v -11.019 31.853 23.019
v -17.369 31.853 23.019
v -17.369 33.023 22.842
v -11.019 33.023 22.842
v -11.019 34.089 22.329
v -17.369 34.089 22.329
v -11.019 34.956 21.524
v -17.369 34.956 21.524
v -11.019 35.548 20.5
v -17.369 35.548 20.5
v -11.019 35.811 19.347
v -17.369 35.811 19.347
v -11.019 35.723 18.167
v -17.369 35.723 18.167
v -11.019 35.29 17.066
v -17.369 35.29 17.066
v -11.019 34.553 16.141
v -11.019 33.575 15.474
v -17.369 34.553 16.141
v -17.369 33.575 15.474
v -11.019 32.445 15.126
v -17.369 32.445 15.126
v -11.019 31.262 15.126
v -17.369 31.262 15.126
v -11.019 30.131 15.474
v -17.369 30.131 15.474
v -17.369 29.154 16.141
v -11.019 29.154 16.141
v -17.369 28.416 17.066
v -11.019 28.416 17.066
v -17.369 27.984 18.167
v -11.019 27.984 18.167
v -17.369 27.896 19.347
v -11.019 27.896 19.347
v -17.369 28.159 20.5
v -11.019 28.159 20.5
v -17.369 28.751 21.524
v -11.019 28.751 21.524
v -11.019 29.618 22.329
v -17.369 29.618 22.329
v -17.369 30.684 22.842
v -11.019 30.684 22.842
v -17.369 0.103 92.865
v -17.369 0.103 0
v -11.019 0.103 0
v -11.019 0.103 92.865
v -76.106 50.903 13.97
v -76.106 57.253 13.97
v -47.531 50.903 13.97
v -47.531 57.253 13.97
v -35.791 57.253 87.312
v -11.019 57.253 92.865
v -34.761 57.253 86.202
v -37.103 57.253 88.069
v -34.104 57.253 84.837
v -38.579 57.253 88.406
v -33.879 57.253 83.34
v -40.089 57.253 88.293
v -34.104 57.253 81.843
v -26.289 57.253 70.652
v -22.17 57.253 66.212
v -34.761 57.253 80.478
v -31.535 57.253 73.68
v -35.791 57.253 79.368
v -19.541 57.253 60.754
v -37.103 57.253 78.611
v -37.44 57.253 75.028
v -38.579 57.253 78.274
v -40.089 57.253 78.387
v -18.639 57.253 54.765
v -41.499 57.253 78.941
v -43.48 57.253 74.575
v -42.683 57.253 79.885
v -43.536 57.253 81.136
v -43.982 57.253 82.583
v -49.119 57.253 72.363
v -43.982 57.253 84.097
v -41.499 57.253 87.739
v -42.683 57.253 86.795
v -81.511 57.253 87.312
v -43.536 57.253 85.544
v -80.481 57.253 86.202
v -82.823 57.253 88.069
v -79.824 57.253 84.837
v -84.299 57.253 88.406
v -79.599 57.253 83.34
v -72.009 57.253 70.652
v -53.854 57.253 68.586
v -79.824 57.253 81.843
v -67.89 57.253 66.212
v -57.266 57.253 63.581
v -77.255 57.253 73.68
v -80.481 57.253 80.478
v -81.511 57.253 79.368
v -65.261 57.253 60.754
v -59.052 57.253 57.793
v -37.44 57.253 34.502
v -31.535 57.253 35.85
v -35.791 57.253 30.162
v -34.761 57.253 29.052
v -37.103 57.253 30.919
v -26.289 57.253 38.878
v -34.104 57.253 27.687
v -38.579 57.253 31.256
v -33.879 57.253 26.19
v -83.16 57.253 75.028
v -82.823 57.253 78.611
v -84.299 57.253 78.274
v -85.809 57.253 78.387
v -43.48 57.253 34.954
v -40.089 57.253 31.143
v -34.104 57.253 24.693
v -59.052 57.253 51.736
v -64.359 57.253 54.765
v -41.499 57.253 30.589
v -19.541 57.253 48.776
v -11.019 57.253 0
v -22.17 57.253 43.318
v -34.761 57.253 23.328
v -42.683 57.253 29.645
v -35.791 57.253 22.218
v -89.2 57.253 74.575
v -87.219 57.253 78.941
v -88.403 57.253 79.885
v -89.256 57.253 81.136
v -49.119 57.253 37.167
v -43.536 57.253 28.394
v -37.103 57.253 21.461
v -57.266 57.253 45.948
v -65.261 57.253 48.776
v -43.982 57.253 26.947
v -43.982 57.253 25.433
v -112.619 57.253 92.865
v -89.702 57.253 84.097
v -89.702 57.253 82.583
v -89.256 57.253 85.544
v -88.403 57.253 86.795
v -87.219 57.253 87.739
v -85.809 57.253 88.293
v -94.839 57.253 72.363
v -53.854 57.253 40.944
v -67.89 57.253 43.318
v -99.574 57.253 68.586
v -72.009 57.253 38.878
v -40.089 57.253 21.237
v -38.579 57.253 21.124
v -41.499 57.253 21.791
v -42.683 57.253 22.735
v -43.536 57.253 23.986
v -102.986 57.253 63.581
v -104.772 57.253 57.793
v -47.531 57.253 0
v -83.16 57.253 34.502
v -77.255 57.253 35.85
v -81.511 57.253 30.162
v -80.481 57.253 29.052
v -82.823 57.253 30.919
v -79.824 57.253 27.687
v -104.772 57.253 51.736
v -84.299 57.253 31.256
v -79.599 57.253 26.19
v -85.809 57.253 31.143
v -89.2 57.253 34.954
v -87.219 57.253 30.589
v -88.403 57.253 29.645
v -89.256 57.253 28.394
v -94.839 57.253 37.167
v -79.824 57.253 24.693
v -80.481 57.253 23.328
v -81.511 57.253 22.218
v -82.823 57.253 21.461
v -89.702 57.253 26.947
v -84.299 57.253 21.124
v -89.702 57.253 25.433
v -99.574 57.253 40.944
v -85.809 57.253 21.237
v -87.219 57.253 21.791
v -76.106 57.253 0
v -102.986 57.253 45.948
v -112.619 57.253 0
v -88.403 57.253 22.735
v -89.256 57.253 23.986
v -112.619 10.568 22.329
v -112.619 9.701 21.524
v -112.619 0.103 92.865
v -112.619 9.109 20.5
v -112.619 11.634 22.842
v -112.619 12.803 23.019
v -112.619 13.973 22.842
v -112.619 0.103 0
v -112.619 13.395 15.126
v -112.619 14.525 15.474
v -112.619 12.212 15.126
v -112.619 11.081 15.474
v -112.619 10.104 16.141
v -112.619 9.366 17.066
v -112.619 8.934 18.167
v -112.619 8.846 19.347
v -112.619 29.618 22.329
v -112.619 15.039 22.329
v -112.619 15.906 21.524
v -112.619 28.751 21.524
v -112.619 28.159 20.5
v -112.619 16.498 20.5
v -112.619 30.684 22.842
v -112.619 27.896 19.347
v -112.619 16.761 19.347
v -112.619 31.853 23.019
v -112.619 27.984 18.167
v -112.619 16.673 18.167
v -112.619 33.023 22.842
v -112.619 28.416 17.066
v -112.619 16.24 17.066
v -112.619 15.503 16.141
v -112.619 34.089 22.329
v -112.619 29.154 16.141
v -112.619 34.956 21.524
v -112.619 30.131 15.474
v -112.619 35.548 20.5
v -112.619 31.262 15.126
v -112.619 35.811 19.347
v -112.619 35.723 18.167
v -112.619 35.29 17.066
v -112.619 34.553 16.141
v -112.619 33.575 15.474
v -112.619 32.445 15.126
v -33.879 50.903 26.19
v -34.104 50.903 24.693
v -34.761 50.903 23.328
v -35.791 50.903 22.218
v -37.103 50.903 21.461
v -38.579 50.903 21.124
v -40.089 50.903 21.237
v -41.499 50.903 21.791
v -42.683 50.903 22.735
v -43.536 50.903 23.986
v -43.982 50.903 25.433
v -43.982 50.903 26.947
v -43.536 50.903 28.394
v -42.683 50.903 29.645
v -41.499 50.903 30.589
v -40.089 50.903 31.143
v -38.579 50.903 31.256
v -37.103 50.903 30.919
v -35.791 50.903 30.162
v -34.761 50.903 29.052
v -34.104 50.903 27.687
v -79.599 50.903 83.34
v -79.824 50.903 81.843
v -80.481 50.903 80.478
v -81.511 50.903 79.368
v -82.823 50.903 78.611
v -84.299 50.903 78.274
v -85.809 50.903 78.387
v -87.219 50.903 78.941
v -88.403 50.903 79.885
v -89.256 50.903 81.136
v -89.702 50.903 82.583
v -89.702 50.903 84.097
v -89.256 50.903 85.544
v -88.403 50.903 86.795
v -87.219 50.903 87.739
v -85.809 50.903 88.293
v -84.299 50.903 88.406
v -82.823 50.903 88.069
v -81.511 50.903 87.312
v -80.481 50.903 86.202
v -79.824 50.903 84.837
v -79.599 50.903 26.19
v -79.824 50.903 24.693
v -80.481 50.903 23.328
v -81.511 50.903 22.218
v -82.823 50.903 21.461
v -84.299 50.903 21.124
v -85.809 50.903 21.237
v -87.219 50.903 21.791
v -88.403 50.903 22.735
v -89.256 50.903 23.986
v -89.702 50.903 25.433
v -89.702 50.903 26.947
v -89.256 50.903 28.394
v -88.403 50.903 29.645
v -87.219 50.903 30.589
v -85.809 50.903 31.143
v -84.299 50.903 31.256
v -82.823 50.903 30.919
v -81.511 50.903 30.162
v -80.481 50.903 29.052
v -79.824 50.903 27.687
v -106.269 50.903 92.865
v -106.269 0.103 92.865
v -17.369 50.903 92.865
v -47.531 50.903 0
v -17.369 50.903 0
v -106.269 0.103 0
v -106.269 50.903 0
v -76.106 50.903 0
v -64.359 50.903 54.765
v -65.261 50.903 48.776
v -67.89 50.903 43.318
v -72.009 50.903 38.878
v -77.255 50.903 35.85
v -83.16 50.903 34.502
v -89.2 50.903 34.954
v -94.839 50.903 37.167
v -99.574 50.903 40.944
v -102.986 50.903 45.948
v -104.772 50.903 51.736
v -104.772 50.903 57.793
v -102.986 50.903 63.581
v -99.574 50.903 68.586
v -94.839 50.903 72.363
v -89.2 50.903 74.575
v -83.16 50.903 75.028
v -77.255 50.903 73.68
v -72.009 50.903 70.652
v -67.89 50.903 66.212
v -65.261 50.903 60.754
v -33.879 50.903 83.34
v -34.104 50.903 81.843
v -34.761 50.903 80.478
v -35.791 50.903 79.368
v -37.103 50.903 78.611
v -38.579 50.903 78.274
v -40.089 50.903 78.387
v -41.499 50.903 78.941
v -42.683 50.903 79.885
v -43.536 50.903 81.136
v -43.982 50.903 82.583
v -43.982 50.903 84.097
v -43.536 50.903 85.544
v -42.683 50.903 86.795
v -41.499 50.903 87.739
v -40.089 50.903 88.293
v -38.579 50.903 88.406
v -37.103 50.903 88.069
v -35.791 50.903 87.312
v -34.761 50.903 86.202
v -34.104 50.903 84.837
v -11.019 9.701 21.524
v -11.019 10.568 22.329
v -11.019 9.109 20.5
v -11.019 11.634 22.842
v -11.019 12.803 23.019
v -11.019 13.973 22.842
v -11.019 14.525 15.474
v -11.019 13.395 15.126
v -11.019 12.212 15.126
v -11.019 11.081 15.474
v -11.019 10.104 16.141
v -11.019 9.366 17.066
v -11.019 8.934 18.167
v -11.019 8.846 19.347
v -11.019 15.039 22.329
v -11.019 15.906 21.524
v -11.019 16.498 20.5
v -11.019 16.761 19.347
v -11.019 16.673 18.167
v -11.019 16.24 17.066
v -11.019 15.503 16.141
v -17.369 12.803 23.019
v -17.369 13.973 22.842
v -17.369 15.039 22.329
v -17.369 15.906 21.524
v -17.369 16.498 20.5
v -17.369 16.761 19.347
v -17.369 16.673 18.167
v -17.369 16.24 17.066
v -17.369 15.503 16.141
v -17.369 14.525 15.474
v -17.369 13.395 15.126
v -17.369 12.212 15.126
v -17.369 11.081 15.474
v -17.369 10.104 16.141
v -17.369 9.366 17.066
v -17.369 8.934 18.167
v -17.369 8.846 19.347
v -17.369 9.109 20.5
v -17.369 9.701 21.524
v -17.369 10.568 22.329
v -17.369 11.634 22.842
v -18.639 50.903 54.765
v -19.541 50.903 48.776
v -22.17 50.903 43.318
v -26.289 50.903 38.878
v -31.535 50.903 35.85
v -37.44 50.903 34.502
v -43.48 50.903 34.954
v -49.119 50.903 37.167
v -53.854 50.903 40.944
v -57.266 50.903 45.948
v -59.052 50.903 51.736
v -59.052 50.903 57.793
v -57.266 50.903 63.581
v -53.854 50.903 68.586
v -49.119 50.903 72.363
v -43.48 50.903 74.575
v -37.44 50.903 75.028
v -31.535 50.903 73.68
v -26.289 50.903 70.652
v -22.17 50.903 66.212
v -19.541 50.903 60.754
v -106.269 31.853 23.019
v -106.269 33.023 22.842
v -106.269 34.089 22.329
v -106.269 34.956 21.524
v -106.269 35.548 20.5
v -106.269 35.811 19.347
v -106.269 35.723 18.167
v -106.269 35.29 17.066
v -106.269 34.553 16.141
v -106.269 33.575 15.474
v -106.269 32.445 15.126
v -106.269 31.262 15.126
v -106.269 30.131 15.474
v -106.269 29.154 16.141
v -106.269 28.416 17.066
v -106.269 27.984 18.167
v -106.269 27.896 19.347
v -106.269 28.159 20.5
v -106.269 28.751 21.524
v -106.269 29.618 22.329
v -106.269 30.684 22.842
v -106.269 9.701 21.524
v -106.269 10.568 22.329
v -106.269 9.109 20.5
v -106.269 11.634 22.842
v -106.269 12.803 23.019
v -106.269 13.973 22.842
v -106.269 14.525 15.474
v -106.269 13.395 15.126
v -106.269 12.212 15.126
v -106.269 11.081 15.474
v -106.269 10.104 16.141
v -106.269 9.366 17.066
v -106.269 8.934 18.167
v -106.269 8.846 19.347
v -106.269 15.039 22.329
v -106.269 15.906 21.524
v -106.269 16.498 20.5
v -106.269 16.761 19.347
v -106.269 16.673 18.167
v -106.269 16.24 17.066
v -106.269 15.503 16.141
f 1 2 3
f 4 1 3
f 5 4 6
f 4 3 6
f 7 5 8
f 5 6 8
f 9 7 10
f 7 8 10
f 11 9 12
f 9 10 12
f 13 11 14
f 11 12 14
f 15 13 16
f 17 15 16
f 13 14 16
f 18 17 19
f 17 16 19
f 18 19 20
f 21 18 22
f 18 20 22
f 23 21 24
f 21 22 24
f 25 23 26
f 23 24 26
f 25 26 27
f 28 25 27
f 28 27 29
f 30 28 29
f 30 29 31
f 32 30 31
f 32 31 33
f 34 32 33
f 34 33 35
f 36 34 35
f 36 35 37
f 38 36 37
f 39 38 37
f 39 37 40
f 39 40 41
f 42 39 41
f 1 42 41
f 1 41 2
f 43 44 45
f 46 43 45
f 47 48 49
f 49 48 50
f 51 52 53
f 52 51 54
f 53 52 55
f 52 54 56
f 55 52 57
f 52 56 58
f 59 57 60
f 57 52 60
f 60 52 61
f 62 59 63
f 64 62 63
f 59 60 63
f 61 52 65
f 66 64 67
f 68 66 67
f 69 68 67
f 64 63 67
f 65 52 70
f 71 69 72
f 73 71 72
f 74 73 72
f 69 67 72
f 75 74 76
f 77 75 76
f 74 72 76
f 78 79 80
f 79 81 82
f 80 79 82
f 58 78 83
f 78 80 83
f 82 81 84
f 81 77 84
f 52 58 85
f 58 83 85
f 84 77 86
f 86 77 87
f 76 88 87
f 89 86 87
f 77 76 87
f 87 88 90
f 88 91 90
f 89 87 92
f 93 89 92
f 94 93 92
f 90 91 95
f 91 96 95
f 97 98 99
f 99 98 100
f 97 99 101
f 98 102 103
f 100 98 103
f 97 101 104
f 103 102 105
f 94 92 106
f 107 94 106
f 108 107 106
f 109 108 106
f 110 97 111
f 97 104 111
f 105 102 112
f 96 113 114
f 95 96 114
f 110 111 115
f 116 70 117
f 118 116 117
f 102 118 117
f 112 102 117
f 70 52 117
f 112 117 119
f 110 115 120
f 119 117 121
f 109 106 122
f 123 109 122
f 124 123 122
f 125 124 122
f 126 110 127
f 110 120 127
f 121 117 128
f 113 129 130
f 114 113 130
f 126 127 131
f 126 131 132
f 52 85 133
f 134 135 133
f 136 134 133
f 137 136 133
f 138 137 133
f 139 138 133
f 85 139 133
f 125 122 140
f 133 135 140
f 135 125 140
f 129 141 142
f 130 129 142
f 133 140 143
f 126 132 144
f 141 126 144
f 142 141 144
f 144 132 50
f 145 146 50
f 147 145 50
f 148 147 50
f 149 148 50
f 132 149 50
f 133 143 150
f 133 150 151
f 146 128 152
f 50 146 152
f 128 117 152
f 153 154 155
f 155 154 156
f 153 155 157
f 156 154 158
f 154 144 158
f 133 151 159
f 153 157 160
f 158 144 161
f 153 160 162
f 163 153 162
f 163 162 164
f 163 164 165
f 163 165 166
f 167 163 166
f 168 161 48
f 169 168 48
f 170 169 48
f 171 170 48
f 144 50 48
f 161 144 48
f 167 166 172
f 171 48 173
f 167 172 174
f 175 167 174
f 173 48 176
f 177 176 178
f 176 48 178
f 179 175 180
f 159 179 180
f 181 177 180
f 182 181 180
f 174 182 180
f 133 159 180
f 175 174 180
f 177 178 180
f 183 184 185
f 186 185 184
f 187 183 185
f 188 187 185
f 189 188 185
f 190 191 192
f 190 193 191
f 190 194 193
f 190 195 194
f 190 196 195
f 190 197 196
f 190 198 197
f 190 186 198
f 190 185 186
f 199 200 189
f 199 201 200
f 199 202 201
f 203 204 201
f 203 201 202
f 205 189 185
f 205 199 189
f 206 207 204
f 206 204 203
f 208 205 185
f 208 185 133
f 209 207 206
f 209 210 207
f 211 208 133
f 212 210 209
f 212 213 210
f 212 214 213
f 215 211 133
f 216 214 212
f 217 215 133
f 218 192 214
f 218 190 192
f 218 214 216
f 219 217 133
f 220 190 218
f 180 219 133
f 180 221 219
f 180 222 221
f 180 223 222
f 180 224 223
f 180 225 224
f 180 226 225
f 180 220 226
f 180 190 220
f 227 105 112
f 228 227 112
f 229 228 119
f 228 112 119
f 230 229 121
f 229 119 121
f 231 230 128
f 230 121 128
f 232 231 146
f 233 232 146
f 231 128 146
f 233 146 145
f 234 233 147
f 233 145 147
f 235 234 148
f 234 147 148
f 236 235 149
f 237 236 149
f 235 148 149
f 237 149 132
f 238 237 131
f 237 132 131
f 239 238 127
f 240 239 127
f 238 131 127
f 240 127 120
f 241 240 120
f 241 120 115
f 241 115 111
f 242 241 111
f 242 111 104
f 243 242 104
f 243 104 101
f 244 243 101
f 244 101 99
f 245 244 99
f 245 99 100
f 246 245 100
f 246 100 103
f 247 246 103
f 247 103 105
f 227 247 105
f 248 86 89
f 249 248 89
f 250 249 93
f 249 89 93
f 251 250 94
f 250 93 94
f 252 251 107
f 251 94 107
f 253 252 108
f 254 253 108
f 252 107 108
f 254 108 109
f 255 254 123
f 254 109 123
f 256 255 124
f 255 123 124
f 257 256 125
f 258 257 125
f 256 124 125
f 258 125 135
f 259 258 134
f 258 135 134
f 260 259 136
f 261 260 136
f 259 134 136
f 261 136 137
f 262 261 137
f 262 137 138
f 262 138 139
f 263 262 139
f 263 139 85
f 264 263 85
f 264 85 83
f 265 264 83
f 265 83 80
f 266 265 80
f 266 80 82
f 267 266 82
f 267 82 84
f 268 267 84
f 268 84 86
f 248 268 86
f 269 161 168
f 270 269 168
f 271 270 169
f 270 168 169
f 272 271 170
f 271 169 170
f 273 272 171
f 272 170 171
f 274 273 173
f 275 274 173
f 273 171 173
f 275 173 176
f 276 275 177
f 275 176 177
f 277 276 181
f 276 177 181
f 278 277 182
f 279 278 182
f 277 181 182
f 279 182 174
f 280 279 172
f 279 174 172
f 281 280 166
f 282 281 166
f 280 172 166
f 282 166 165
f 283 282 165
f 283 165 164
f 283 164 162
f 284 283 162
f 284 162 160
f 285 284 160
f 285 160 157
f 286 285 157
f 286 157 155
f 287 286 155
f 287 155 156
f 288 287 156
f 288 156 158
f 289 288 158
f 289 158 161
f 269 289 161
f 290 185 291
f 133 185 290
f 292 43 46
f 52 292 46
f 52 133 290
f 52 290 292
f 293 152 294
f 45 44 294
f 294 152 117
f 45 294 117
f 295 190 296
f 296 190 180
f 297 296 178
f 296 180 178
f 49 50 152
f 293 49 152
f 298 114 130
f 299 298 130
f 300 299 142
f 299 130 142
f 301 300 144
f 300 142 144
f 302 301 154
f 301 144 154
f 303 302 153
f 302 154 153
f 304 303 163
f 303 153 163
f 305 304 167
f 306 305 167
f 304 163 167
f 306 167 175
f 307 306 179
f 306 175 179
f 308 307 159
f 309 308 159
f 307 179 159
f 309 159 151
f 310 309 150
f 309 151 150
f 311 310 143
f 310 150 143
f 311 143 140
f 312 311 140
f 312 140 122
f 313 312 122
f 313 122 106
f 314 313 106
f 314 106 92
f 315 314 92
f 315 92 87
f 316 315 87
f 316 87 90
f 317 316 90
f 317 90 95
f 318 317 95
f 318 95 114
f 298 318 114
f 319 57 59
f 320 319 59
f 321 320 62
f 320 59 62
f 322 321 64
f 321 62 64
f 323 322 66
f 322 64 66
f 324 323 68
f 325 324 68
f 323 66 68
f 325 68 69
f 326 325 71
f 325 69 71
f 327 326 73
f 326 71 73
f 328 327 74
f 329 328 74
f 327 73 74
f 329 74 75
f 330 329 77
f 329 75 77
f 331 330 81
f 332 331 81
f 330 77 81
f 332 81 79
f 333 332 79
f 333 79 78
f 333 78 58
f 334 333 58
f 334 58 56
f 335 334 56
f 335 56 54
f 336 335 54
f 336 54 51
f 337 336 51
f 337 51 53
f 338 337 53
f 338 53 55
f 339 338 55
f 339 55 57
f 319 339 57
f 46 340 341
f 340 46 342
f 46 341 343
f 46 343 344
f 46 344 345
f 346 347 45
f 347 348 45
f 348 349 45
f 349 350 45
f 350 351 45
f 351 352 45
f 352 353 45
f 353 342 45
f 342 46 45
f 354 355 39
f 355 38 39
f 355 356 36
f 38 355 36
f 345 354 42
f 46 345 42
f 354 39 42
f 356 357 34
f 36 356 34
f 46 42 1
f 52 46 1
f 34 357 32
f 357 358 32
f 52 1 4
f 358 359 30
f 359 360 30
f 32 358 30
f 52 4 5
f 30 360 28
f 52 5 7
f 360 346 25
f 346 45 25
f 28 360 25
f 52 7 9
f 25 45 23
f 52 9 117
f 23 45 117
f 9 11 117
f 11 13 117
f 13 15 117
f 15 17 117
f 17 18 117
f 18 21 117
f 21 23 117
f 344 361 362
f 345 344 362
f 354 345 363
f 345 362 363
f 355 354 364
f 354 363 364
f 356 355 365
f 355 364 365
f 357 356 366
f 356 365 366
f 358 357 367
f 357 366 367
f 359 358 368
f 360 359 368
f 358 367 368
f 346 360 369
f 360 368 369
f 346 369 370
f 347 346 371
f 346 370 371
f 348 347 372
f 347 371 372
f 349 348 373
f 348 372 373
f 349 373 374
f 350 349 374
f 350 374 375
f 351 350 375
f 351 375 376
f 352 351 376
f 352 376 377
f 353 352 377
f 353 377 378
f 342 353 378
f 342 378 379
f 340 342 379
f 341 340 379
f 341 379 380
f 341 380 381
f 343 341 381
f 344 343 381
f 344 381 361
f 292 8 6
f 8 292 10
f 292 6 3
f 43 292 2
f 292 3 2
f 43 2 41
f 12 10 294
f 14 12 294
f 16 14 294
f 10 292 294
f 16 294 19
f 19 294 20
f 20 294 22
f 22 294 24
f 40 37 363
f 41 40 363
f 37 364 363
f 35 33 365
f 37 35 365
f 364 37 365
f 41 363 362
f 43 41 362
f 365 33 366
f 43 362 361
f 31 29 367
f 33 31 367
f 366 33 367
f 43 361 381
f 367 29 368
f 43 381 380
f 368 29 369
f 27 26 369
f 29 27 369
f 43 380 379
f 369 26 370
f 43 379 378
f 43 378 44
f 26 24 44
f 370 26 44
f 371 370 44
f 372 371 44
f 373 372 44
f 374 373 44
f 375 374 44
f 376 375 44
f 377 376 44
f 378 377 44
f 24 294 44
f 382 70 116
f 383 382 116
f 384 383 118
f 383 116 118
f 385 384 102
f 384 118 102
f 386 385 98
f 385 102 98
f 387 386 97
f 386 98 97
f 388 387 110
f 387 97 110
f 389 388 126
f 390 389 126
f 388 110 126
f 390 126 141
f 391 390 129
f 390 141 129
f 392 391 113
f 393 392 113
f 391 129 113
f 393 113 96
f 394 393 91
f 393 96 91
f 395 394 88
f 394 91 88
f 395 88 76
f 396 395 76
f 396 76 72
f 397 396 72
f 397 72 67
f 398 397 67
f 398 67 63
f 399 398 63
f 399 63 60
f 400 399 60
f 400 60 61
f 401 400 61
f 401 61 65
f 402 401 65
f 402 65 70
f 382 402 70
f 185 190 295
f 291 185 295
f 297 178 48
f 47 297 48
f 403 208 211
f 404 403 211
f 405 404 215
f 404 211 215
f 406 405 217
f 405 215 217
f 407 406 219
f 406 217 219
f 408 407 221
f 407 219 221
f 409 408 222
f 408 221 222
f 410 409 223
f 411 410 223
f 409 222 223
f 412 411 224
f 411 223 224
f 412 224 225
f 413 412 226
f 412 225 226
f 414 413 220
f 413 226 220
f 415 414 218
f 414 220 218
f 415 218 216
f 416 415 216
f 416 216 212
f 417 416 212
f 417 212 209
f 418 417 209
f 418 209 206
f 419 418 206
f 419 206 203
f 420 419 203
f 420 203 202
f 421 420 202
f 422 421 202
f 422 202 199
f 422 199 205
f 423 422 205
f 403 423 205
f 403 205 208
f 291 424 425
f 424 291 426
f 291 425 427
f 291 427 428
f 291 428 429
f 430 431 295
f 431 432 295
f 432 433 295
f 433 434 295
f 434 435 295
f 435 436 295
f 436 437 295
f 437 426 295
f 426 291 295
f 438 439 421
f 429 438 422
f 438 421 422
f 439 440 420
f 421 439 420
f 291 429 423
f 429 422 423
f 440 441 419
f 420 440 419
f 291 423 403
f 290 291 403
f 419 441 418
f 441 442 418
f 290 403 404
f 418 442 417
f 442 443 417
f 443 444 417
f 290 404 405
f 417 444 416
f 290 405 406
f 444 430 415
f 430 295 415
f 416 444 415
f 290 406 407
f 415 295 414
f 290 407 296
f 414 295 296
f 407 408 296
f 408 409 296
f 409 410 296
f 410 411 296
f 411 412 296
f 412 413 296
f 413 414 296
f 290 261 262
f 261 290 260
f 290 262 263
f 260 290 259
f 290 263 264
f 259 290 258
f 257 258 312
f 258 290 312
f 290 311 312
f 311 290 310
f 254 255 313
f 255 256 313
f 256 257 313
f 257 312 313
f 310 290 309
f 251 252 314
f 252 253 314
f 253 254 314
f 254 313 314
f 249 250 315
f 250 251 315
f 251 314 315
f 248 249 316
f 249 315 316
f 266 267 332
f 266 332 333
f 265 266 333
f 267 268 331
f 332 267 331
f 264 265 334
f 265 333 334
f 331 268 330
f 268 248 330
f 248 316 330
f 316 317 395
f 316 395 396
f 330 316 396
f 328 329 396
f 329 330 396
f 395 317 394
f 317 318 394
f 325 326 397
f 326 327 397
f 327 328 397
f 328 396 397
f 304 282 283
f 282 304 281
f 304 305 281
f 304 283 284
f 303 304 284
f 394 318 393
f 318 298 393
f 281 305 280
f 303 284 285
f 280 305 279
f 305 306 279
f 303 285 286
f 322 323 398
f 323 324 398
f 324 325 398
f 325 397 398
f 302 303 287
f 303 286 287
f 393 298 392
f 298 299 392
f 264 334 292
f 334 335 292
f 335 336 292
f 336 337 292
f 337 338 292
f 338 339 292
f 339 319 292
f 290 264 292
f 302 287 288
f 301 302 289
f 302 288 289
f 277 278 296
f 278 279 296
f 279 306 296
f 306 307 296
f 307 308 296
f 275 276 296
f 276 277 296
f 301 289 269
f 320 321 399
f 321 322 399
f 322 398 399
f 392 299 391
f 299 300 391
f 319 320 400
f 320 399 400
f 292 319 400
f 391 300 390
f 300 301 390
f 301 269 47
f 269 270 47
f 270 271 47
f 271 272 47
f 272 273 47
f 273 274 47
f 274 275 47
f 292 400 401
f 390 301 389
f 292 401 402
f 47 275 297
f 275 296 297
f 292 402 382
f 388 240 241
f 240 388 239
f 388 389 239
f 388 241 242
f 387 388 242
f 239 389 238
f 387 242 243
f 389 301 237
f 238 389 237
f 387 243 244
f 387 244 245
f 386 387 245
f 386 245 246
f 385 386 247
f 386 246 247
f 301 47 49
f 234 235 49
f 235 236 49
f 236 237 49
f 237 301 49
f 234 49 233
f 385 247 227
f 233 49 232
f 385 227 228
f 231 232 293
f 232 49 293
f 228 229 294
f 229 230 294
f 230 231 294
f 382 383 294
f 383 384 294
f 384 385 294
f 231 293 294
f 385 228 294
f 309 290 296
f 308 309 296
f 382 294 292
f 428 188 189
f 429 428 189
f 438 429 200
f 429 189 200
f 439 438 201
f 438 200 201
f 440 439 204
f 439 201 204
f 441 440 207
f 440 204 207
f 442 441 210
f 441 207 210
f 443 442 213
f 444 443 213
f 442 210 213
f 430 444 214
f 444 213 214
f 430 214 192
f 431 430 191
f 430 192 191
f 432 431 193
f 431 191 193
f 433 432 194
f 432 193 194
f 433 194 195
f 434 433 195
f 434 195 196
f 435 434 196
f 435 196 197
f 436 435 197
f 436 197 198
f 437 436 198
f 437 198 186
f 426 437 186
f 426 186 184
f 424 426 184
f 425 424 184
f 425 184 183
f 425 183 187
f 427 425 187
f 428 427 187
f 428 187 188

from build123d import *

# Parameters (mm, degrees)
SKETCH1_W                   = 6.35
SKETCH1_H                   = 57.15
SKETCH1_W_2                 = 88.9
SKETCH1_H_2                 = 6.35
BOSS_EXTRUDE1_DEPTH         = 92.86494
MASTER_CYLINDER_MOUNT_REACH = 59.15
SKETCH2_R                   = 5.08
SKETCH2_R_2                 = 20.32
SKETCH3_R                   = 3.96875
BRACKET_MOUNT_DEPTH         = 102.6


with BuildPart() as part:
    # Sketch1 → Boss-Extrude1 (new body)
    with BuildSketch(Plane.XY):
        with Locations((-109.443697604, 28.678448761)):
            Rectangle(SKETCH1_W, SKETCH1_H)
        with Locations((-61.818697604, 54.078448761)):
            Rectangle(SKETCH1_W_2, SKETCH1_H_2)
        Polygon((-17.368697604, 57.253448761), (-17.368697604, 50.903448761), (-17.368697604, 0.103448761), (-11.018697604, 0.103448761), (-11.018697604, 57.253448761), align=None)
    extrude(amount=BOSS_EXTRUDE1_DEPTH)

    # Sketch2 → Master Cylinder Mount (cut, up to next)
    with BuildSketch(Plane(origin=(0, 57.253448761, 0), x_dir=(1, 0, 0), z_dir=(0, 1, 0)), mode=Mode.PRIVATE) as master_cylinder_mount_sk1:
        Polygon((-47.531197604, 0), (-76.106197604, 0), (-76.106197604, -13.97), (-69.121197604, -13.97), (-54.516197604, -13.97), (-47.531197604, -13.97), align=None)
    master_cylinder_mount_tool1 = extrude(master_cylinder_mount_sk1.sketch, amount=-MASTER_CYLINDER_MOUNT_REACH, mode=Mode.PRIVATE) & part.part
    add(master_cylinder_mount_tool1.solids().sort_by_distance((-61.818698, 57.253449, 6.985))[0], mode=Mode.SUBTRACT)
    # Sketch2 → Master Cylinder Mount (cut, up to next)
    with BuildSketch(Plane(origin=(0, 57.253448761, 0), x_dir=(1, 0, 0), z_dir=(0, 1, 0)), mode=Mode.PRIVATE) as master_cylinder_mount_sk2:
        with Locations((-38.958697604, -26.18994)):
            Circle(SKETCH2_R)
    master_cylinder_mount_tool2 = extrude(master_cylinder_mount_sk2.sketch, amount=-MASTER_CYLINDER_MOUNT_REACH, mode=Mode.PRIVATE) & part.part
    add(master_cylinder_mount_tool2.solids().sort_by_distance((-38.958698, 57.253449, 26.18994))[0], mode=Mode.SUBTRACT)
    # Sketch2 → Master Cylinder Mount (cut, up to next)
    with BuildSketch(Plane(origin=(0, 57.253448761, 0), x_dir=(1, 0, 0), z_dir=(0, 1, 0)), mode=Mode.PRIVATE) as master_cylinder_mount_sk3:
        with Locations((-84.678697604, -26.18994)):
            Circle(SKETCH2_R)
    master_cylinder_mount_tool3 = extrude(master_cylinder_mount_sk3.sketch, amount=-MASTER_CYLINDER_MOUNT_REACH, mode=Mode.PRIVATE) & part.part
    add(master_cylinder_mount_tool3.solids().sort_by_distance((-84.678698, 57.253449, 26.18994))[0], mode=Mode.SUBTRACT)
    # Sketch2 → Master Cylinder Mount (cut, up to next)
    with BuildSketch(Plane(origin=(0, 57.253448761, 0), x_dir=(1, 0, 0), z_dir=(0, 1, 0)), mode=Mode.PRIVATE) as master_cylinder_mount_sk4:
        with Locations((-84.678697604, -83.33994)):
            Circle(SKETCH2_R)
    master_cylinder_mount_tool4 = extrude(master_cylinder_mount_sk4.sketch, amount=-MASTER_CYLINDER_MOUNT_REACH, mode=Mode.PRIVATE) & part.part
    add(master_cylinder_mount_tool4.solids().sort_by_distance((-84.678698, 57.253449, 83.33994))[0], mode=Mode.SUBTRACT)
    # Sketch2 → Master Cylinder Mount (cut, up to next)
    with BuildSketch(Plane(origin=(0, 57.253448761, 0), x_dir=(1, 0, 0), z_dir=(0, 1, 0)), mode=Mode.PRIVATE) as master_cylinder_mount_sk5:
        with Locations((-38.958697604, -83.33994)):
            Circle(SKETCH2_R)
    master_cylinder_mount_tool5 = extrude(master_cylinder_mount_sk5.sketch, amount=-MASTER_CYLINDER_MOUNT_REACH, mode=Mode.PRIVATE) & part.part
    add(master_cylinder_mount_tool5.solids().sort_by_distance((-38.958698, 57.253449, 83.33994))[0], mode=Mode.SUBTRACT)
    # Sketch2 → Master Cylinder Mount (cut, up to next)
    with BuildSketch(Plane(origin=(0, 57.253448761, 0), x_dir=(1, 0, 0), z_dir=(0, 1, 0)), mode=Mode.PRIVATE) as master_cylinder_mount_sk6:
        with Locations((-38.958697604, -54.76494)):
            Circle(SKETCH2_R_2)
    master_cylinder_mount_tool6 = extrude(master_cylinder_mount_sk6.sketch, amount=-MASTER_CYLINDER_MOUNT_REACH, mode=Mode.PRIVATE) & part.part
    add(master_cylinder_mount_tool6.solids().sort_by_distance((-38.958698, 57.253449, 54.76494))[0], mode=Mode.SUBTRACT)
    # Sketch2 → Master Cylinder Mount (cut, up to next)
    with BuildSketch(Plane(origin=(0, 57.253448761, 0), x_dir=(1, 0, 0), z_dir=(0, 1, 0)), mode=Mode.PRIVATE) as master_cylinder_mount_sk7:
        with Locations((-84.678697604, -54.76494)):
            Circle(SKETCH2_R_2)
    master_cylinder_mount_tool7 = extrude(master_cylinder_mount_sk7.sketch, amount=-MASTER_CYLINDER_MOUNT_REACH, mode=Mode.PRIVATE) & part.part
    add(master_cylinder_mount_tool7.solids().sort_by_distance((-84.678698, 57.253449, 54.76494))[0], mode=Mode.SUBTRACT)

    # Sketch3 → Bracket Mount (cut, through all)
    with BuildSketch(Plane.ZY.offset(112.618697604)):
        with Locations((19.05, 12.803448761)):
            Circle(SKETCH3_R)
        with Locations((19.05, 31.853448761)):
            Circle(SKETCH3_R)
    extrude(amount=-BRACKET_MOUNT_DEPTH, mode=Mode.SUBTRACT)


solid = part.part
